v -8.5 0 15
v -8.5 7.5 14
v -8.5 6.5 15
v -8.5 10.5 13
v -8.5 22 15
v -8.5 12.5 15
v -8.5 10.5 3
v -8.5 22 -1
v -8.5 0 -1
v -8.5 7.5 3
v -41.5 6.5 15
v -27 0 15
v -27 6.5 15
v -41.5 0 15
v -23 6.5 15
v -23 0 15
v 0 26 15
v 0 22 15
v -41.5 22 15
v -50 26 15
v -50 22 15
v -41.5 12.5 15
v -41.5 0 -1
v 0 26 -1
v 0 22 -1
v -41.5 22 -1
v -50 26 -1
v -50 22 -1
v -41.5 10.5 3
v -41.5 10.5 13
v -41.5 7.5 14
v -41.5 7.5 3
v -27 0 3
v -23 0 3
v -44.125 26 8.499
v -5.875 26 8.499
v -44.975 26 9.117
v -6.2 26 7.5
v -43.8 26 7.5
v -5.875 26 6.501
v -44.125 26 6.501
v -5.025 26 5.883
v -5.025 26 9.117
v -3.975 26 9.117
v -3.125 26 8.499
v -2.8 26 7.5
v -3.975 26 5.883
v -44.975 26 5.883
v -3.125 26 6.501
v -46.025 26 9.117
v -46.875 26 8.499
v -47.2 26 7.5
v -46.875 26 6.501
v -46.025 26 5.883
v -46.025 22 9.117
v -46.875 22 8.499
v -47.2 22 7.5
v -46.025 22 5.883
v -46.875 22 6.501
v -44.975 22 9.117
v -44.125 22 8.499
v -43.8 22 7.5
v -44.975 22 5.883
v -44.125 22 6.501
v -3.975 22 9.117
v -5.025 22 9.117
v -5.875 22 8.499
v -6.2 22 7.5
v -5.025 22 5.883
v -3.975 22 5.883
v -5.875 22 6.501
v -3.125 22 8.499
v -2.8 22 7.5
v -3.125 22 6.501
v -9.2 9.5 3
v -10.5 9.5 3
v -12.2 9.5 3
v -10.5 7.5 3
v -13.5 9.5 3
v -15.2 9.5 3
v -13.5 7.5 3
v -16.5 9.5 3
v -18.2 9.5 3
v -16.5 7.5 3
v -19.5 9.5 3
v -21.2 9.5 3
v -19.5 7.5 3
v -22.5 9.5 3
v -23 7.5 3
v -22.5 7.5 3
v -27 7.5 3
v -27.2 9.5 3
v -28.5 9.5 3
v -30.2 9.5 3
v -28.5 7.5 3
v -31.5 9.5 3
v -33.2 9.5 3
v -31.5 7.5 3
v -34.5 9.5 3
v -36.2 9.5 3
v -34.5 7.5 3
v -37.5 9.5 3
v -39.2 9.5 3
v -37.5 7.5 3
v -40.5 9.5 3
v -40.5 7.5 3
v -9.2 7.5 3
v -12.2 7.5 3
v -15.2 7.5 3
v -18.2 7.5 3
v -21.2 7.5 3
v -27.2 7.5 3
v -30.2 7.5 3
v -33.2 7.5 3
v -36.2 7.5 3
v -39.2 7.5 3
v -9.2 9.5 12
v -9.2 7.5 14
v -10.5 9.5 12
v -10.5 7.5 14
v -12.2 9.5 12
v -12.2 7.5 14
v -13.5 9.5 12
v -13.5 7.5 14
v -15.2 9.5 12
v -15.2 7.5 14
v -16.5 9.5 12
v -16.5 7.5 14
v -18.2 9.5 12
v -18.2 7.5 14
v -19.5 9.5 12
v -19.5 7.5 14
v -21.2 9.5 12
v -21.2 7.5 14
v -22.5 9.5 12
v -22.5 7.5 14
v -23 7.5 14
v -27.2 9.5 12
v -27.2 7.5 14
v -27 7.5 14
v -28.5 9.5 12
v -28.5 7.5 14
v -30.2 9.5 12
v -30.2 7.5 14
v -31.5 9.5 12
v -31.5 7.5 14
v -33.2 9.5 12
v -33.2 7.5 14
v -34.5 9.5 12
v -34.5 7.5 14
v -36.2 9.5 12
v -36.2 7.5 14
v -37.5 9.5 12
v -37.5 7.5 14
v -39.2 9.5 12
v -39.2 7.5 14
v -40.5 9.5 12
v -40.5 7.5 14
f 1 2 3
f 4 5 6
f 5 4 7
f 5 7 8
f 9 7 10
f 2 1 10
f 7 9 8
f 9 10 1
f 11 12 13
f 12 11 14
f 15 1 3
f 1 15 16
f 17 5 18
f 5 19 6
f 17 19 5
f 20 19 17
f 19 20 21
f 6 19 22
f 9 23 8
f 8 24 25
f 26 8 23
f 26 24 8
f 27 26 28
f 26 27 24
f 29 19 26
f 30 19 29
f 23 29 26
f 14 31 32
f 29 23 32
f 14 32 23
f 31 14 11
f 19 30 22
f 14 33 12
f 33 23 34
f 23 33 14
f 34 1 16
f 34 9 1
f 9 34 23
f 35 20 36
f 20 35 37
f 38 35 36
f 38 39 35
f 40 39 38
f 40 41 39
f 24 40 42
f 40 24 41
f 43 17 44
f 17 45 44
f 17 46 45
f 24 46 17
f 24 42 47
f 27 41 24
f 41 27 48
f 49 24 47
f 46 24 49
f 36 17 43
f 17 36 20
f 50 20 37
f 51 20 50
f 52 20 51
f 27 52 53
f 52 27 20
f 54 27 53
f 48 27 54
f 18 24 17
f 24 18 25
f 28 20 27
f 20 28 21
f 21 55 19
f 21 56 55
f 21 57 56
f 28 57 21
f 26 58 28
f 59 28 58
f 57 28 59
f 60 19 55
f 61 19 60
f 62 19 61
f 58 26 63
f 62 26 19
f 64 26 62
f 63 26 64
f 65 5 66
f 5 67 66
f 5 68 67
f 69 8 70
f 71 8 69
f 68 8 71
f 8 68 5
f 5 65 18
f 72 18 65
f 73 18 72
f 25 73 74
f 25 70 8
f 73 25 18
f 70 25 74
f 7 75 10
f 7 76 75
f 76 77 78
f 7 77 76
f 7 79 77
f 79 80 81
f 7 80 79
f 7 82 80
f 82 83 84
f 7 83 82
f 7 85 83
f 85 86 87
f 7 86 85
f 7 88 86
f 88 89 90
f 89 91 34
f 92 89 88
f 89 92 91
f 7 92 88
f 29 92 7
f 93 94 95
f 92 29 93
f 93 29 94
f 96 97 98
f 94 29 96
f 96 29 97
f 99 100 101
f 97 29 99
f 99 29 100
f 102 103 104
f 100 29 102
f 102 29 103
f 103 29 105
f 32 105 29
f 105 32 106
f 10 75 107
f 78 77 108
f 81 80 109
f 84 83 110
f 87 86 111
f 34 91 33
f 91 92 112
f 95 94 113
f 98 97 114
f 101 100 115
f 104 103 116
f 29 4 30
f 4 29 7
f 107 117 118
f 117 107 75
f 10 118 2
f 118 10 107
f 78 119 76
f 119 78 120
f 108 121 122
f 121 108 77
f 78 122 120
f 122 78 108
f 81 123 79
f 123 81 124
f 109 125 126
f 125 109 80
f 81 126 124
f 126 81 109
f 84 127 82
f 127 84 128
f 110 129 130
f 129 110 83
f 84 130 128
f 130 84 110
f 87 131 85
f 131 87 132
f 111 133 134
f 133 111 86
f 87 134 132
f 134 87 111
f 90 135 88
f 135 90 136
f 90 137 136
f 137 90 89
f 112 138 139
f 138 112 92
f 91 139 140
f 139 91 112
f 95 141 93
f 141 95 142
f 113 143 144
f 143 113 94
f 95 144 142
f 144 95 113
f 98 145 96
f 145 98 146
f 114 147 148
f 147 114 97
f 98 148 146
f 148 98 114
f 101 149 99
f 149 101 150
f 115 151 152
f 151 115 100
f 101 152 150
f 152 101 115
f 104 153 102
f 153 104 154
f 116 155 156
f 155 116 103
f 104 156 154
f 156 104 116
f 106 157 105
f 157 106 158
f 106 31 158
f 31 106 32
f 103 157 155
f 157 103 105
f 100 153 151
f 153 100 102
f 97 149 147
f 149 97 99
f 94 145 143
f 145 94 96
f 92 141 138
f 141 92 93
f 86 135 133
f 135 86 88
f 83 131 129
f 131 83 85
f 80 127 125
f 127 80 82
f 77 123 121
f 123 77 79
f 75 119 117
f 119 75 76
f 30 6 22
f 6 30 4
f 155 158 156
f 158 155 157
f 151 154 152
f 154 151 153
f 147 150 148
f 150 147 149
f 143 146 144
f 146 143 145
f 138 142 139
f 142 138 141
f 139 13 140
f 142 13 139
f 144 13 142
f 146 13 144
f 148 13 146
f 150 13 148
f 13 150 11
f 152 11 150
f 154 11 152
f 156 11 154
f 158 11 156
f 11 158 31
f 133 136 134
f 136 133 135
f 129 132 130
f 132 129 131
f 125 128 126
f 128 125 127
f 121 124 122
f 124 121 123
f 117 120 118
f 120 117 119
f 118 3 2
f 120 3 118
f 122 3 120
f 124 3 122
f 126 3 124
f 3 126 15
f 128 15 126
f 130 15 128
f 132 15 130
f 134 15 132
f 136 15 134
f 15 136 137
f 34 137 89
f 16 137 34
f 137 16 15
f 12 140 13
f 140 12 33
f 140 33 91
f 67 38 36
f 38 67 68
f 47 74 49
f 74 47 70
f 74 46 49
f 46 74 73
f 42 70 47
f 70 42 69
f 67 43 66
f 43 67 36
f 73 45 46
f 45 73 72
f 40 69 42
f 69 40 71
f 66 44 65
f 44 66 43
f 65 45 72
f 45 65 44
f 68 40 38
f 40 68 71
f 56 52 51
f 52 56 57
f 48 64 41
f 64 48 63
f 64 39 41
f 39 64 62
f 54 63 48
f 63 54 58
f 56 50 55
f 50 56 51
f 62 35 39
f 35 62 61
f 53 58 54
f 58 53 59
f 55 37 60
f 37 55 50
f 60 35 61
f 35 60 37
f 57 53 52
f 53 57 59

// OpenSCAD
// PRUSA iteration3
// Y belt holder
// GNU GPL v3
// Josef Průša <iam@josefprusa.cz> and contributors
// http://www.reprap.org/wiki/Prusa_Mendel
// http://prusamendel.org


module belt_holder_base(){
 translate([-33-8.5,0,-1]) cube([33,15,16]); 
 translate([-33-8.5,11,-1]) cube([33,15,16]);
 translate([-50,22,-1]) cube([50,4,16]);	
}

module belt_holder_beltcut(){
 position_tweak=-0.2;
 // Belt slit
 translate([-66,-0.5+10,3]) cube([67,1,15]);
 // Smooth insert cutout
 translate([-66,-0.5+10,12]) rotate([45,0,0]) cube([67,15,15]);
 // Individual teeth
 for ( i = [0 : 23] ){
  translate([0-i*3+position_tweak,-0.5+8,3]) cube([1.7,3,15]);
 }
 // Middle opening
 translate([-2-25,-1,3]) cube([4,11,15]);	
}

module belt_holder_holes(){
 translate([-4.5,0,7.5]) rotate([-90,0,0]) cylinder(h=30, r=1.7, $fn=10);
 translate([-45.5,0,7.5]) rotate([-90,0,0]) cylinder(h=30, r=1.7, $fn=10);
}

// Final part
module belt_holder(){
 difference(){
  belt_holder_base();
  belt_holder_beltcut();
  belt_holder_holes();
 }
}

belt_holder();
